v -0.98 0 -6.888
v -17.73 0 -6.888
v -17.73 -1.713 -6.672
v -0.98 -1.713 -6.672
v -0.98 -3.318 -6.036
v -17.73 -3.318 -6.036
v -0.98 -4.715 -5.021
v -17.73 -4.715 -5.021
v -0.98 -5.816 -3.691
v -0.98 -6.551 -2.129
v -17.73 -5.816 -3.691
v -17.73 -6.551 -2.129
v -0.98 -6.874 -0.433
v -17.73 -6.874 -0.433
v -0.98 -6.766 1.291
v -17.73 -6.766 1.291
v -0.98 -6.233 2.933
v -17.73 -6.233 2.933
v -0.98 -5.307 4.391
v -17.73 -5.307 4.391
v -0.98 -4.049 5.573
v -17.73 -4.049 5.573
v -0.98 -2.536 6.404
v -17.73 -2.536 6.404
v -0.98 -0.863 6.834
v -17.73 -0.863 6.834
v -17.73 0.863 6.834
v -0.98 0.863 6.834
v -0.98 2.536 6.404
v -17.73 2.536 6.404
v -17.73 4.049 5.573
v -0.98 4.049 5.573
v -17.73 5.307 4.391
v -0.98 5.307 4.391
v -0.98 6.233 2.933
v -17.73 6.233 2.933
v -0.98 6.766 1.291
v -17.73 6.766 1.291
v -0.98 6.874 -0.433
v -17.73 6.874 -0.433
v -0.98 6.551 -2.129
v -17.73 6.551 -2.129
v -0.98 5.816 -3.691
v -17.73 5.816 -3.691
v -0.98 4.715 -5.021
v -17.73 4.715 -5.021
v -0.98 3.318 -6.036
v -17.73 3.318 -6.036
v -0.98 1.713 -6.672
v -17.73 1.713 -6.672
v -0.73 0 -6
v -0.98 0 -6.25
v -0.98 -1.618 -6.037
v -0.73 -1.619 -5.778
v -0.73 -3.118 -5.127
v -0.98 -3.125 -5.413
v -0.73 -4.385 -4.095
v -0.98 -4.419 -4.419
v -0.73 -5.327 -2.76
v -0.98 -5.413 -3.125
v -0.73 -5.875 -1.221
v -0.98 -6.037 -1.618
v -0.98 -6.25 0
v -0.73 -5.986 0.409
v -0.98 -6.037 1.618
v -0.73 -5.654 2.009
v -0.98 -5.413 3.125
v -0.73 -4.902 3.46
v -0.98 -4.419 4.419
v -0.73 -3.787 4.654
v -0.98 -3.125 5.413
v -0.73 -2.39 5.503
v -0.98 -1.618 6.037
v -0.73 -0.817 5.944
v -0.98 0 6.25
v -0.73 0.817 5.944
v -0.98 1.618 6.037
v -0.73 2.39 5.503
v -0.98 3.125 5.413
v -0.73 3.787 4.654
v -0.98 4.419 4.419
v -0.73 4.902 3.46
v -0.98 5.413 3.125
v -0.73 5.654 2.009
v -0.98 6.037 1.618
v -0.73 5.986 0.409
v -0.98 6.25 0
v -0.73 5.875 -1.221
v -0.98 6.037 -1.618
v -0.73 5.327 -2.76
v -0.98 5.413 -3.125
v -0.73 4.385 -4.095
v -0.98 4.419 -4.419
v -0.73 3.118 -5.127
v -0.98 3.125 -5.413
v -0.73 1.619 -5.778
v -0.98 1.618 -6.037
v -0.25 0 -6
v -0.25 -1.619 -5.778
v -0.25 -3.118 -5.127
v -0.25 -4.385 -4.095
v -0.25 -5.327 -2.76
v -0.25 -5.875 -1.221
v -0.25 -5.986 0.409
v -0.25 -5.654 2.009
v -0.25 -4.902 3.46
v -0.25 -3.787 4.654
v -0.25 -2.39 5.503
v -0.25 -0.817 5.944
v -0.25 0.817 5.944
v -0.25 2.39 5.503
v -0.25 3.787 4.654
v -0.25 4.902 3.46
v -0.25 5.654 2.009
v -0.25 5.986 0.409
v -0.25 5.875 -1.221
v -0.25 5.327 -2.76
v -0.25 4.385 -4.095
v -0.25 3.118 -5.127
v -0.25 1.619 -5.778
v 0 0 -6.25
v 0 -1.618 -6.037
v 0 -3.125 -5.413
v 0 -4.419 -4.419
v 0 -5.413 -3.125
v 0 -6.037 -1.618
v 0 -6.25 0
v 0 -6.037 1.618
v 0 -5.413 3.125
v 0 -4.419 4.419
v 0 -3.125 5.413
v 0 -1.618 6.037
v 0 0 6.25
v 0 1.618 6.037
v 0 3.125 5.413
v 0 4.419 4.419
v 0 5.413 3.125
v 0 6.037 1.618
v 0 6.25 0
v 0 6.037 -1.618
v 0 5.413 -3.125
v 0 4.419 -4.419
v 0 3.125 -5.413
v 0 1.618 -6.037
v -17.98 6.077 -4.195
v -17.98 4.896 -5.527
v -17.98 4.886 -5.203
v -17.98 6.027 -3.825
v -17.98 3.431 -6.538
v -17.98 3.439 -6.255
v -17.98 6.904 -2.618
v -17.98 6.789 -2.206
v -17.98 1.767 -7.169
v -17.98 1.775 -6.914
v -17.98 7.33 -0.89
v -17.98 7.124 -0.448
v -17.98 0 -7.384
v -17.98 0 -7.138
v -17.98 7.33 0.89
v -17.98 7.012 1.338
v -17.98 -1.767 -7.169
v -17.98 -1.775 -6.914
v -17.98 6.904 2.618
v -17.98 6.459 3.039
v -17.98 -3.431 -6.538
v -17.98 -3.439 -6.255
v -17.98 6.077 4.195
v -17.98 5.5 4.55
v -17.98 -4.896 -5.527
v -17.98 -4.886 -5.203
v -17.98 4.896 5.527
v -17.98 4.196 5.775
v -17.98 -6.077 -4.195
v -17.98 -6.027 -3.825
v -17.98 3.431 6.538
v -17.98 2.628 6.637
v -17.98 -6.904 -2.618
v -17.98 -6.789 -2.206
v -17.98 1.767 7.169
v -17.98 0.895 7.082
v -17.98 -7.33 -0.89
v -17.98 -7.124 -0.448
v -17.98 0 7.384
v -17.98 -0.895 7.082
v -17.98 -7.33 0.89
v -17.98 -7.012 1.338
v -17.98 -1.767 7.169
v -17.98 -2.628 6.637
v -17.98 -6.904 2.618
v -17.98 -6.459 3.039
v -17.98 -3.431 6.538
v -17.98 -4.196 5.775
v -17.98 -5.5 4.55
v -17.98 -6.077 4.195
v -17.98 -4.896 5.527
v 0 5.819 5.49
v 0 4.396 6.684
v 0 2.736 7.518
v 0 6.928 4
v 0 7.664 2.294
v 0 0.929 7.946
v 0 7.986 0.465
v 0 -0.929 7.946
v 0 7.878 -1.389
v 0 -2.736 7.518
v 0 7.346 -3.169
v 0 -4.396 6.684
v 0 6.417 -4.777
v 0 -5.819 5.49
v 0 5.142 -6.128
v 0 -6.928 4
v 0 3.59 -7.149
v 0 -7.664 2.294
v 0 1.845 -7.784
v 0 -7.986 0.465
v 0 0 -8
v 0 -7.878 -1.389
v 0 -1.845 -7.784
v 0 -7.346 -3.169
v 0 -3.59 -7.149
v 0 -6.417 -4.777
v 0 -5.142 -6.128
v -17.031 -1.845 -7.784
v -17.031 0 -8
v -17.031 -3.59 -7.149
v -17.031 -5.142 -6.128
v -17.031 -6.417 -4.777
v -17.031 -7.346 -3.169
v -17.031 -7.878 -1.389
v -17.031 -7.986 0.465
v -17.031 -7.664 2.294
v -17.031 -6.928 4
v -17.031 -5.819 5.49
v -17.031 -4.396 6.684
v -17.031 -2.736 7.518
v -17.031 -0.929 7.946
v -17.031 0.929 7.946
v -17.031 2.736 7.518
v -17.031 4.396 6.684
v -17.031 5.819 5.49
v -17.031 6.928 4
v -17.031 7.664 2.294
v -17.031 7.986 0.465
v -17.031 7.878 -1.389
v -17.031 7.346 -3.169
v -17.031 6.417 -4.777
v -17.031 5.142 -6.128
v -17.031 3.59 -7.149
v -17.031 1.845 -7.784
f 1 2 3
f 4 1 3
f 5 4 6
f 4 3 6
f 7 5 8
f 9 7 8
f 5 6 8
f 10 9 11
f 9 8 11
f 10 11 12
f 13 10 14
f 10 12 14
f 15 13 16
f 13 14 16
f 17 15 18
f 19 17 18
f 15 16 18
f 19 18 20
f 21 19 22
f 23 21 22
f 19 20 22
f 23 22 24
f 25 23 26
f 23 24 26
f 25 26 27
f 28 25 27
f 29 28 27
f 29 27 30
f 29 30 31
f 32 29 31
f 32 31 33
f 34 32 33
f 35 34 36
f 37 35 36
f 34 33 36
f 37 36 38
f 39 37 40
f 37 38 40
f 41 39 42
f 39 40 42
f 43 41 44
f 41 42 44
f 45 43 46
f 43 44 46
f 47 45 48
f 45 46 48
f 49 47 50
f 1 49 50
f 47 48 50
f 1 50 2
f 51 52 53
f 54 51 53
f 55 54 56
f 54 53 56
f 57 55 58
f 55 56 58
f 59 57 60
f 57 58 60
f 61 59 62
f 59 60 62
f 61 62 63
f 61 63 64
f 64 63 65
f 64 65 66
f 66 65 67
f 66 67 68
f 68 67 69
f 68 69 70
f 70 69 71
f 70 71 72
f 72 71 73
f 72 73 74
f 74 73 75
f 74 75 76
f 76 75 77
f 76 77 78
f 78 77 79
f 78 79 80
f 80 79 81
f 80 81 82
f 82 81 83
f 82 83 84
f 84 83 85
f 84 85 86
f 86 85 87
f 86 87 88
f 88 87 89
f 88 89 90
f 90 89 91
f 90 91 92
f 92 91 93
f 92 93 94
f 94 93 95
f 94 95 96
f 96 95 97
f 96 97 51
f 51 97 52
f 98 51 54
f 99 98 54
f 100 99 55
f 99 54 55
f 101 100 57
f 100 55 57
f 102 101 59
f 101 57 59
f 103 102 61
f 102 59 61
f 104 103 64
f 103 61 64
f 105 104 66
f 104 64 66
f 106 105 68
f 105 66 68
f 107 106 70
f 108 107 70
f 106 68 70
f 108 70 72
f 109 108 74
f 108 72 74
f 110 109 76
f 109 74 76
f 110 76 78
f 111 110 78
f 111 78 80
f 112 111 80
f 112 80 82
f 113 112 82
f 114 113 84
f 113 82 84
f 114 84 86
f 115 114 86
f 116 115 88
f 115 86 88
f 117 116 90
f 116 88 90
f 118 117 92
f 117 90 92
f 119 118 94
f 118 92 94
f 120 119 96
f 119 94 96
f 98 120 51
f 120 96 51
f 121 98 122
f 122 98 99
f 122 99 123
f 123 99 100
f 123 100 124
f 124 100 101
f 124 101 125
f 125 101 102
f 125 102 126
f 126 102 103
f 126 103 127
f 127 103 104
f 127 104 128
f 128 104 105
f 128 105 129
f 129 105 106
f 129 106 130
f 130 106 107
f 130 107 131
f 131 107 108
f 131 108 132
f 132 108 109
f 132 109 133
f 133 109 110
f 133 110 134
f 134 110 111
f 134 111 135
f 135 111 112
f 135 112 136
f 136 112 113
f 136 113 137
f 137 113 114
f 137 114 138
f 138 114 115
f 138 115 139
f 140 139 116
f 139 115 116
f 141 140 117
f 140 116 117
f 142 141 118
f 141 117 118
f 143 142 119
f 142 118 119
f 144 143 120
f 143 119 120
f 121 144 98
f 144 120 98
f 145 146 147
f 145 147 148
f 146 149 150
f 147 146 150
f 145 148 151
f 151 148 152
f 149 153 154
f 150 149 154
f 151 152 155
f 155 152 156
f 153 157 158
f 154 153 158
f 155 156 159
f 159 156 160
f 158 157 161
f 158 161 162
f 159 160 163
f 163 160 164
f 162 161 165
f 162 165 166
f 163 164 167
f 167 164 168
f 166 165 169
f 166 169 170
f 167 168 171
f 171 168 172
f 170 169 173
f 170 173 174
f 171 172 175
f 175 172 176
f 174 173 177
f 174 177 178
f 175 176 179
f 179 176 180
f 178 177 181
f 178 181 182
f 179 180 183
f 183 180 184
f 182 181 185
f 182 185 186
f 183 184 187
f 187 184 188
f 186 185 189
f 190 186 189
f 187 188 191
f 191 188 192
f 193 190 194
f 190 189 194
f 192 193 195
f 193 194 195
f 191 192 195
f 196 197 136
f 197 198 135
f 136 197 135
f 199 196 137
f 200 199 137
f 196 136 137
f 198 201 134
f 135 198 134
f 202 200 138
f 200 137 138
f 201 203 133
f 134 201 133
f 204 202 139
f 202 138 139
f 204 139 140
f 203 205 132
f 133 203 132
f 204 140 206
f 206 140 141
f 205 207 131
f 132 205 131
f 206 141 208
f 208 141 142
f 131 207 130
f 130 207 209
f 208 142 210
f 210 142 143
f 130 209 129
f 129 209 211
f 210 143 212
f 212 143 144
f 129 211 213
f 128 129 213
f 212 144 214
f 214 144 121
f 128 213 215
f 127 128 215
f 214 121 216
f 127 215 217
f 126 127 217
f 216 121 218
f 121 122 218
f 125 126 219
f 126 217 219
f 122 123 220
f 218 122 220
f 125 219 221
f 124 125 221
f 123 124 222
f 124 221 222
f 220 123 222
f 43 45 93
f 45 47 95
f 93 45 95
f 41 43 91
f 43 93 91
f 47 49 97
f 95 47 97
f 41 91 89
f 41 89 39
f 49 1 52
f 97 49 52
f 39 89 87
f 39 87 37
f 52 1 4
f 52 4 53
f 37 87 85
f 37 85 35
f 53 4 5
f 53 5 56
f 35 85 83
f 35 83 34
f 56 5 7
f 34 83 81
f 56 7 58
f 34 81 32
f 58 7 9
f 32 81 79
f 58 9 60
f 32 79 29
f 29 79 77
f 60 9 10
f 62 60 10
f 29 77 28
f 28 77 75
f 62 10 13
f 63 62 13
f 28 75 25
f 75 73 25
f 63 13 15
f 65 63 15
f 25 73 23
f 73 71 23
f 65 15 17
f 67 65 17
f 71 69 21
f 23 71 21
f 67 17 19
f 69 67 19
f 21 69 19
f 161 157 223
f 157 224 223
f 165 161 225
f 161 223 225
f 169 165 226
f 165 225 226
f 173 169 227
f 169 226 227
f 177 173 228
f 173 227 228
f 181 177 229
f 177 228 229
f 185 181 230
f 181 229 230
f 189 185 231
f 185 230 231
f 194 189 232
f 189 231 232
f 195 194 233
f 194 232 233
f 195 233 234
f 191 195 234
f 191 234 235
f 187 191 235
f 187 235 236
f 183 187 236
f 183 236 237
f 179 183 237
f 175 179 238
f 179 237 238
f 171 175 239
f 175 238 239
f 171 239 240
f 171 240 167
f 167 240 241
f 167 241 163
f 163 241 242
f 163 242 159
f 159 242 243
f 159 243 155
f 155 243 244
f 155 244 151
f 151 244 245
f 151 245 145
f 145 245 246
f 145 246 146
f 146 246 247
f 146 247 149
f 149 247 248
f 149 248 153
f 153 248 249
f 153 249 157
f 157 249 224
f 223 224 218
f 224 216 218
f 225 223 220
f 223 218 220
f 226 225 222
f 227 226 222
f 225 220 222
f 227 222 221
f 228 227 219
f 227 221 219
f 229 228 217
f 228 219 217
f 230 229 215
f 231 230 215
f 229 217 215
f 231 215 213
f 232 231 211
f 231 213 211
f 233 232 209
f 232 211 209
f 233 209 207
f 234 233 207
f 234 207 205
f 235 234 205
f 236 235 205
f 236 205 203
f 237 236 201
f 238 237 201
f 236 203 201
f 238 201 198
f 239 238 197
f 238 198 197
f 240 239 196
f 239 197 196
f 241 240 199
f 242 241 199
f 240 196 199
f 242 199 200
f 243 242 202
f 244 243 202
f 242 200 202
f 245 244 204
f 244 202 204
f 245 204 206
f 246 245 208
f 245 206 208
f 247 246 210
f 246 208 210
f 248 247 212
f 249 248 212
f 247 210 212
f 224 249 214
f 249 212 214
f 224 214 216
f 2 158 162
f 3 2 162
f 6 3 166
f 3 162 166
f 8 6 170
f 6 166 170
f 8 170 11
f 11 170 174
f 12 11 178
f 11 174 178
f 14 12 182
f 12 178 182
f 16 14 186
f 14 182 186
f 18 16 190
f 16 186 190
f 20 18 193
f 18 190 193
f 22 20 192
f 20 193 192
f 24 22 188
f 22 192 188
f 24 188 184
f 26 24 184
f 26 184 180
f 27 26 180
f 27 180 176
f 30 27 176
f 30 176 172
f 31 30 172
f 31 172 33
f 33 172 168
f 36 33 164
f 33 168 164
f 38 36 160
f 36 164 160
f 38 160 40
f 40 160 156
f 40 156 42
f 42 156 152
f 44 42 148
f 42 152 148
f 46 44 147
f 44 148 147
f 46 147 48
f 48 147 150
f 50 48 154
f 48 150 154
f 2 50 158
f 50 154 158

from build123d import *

# Parameters (mm, degrees)
CHAFL_N10_SIZE = 0.25


with BuildPart() as part:
    # Sketch1 → Revolve1 (revolve)
    with BuildSketch(Plane.XY, mode=Mode.PRIVATE) as revolve1_sk:
        Polygon((-17.979823496, 7.383932563), (-17.031162834, 8), (0, 8), (0, 6), (-0.979823496, 6), (-0.979823496, 6.888071888), (-17.979823496, 6.888071888), align=None)
    revolve(revolve1_sk.sketch.rotate(Axis((0, 0, 0), (-1, 0, 0)), 90), axis=Axis((0, 0, 0), (-1, 0, 0)))

    # Chaflán10
    chafl_n10_edges = [part.edges().sort_by_distance(p)[0] for p in [
        (-0.979823496, 0, 6),
        (-17.979823496, 0, 6.888071888),
        (0, 0, 6),
    ]]
    chamfer(chafl_n10_edges, length=CHAFL_N10_SIZE)


solid = part.part
